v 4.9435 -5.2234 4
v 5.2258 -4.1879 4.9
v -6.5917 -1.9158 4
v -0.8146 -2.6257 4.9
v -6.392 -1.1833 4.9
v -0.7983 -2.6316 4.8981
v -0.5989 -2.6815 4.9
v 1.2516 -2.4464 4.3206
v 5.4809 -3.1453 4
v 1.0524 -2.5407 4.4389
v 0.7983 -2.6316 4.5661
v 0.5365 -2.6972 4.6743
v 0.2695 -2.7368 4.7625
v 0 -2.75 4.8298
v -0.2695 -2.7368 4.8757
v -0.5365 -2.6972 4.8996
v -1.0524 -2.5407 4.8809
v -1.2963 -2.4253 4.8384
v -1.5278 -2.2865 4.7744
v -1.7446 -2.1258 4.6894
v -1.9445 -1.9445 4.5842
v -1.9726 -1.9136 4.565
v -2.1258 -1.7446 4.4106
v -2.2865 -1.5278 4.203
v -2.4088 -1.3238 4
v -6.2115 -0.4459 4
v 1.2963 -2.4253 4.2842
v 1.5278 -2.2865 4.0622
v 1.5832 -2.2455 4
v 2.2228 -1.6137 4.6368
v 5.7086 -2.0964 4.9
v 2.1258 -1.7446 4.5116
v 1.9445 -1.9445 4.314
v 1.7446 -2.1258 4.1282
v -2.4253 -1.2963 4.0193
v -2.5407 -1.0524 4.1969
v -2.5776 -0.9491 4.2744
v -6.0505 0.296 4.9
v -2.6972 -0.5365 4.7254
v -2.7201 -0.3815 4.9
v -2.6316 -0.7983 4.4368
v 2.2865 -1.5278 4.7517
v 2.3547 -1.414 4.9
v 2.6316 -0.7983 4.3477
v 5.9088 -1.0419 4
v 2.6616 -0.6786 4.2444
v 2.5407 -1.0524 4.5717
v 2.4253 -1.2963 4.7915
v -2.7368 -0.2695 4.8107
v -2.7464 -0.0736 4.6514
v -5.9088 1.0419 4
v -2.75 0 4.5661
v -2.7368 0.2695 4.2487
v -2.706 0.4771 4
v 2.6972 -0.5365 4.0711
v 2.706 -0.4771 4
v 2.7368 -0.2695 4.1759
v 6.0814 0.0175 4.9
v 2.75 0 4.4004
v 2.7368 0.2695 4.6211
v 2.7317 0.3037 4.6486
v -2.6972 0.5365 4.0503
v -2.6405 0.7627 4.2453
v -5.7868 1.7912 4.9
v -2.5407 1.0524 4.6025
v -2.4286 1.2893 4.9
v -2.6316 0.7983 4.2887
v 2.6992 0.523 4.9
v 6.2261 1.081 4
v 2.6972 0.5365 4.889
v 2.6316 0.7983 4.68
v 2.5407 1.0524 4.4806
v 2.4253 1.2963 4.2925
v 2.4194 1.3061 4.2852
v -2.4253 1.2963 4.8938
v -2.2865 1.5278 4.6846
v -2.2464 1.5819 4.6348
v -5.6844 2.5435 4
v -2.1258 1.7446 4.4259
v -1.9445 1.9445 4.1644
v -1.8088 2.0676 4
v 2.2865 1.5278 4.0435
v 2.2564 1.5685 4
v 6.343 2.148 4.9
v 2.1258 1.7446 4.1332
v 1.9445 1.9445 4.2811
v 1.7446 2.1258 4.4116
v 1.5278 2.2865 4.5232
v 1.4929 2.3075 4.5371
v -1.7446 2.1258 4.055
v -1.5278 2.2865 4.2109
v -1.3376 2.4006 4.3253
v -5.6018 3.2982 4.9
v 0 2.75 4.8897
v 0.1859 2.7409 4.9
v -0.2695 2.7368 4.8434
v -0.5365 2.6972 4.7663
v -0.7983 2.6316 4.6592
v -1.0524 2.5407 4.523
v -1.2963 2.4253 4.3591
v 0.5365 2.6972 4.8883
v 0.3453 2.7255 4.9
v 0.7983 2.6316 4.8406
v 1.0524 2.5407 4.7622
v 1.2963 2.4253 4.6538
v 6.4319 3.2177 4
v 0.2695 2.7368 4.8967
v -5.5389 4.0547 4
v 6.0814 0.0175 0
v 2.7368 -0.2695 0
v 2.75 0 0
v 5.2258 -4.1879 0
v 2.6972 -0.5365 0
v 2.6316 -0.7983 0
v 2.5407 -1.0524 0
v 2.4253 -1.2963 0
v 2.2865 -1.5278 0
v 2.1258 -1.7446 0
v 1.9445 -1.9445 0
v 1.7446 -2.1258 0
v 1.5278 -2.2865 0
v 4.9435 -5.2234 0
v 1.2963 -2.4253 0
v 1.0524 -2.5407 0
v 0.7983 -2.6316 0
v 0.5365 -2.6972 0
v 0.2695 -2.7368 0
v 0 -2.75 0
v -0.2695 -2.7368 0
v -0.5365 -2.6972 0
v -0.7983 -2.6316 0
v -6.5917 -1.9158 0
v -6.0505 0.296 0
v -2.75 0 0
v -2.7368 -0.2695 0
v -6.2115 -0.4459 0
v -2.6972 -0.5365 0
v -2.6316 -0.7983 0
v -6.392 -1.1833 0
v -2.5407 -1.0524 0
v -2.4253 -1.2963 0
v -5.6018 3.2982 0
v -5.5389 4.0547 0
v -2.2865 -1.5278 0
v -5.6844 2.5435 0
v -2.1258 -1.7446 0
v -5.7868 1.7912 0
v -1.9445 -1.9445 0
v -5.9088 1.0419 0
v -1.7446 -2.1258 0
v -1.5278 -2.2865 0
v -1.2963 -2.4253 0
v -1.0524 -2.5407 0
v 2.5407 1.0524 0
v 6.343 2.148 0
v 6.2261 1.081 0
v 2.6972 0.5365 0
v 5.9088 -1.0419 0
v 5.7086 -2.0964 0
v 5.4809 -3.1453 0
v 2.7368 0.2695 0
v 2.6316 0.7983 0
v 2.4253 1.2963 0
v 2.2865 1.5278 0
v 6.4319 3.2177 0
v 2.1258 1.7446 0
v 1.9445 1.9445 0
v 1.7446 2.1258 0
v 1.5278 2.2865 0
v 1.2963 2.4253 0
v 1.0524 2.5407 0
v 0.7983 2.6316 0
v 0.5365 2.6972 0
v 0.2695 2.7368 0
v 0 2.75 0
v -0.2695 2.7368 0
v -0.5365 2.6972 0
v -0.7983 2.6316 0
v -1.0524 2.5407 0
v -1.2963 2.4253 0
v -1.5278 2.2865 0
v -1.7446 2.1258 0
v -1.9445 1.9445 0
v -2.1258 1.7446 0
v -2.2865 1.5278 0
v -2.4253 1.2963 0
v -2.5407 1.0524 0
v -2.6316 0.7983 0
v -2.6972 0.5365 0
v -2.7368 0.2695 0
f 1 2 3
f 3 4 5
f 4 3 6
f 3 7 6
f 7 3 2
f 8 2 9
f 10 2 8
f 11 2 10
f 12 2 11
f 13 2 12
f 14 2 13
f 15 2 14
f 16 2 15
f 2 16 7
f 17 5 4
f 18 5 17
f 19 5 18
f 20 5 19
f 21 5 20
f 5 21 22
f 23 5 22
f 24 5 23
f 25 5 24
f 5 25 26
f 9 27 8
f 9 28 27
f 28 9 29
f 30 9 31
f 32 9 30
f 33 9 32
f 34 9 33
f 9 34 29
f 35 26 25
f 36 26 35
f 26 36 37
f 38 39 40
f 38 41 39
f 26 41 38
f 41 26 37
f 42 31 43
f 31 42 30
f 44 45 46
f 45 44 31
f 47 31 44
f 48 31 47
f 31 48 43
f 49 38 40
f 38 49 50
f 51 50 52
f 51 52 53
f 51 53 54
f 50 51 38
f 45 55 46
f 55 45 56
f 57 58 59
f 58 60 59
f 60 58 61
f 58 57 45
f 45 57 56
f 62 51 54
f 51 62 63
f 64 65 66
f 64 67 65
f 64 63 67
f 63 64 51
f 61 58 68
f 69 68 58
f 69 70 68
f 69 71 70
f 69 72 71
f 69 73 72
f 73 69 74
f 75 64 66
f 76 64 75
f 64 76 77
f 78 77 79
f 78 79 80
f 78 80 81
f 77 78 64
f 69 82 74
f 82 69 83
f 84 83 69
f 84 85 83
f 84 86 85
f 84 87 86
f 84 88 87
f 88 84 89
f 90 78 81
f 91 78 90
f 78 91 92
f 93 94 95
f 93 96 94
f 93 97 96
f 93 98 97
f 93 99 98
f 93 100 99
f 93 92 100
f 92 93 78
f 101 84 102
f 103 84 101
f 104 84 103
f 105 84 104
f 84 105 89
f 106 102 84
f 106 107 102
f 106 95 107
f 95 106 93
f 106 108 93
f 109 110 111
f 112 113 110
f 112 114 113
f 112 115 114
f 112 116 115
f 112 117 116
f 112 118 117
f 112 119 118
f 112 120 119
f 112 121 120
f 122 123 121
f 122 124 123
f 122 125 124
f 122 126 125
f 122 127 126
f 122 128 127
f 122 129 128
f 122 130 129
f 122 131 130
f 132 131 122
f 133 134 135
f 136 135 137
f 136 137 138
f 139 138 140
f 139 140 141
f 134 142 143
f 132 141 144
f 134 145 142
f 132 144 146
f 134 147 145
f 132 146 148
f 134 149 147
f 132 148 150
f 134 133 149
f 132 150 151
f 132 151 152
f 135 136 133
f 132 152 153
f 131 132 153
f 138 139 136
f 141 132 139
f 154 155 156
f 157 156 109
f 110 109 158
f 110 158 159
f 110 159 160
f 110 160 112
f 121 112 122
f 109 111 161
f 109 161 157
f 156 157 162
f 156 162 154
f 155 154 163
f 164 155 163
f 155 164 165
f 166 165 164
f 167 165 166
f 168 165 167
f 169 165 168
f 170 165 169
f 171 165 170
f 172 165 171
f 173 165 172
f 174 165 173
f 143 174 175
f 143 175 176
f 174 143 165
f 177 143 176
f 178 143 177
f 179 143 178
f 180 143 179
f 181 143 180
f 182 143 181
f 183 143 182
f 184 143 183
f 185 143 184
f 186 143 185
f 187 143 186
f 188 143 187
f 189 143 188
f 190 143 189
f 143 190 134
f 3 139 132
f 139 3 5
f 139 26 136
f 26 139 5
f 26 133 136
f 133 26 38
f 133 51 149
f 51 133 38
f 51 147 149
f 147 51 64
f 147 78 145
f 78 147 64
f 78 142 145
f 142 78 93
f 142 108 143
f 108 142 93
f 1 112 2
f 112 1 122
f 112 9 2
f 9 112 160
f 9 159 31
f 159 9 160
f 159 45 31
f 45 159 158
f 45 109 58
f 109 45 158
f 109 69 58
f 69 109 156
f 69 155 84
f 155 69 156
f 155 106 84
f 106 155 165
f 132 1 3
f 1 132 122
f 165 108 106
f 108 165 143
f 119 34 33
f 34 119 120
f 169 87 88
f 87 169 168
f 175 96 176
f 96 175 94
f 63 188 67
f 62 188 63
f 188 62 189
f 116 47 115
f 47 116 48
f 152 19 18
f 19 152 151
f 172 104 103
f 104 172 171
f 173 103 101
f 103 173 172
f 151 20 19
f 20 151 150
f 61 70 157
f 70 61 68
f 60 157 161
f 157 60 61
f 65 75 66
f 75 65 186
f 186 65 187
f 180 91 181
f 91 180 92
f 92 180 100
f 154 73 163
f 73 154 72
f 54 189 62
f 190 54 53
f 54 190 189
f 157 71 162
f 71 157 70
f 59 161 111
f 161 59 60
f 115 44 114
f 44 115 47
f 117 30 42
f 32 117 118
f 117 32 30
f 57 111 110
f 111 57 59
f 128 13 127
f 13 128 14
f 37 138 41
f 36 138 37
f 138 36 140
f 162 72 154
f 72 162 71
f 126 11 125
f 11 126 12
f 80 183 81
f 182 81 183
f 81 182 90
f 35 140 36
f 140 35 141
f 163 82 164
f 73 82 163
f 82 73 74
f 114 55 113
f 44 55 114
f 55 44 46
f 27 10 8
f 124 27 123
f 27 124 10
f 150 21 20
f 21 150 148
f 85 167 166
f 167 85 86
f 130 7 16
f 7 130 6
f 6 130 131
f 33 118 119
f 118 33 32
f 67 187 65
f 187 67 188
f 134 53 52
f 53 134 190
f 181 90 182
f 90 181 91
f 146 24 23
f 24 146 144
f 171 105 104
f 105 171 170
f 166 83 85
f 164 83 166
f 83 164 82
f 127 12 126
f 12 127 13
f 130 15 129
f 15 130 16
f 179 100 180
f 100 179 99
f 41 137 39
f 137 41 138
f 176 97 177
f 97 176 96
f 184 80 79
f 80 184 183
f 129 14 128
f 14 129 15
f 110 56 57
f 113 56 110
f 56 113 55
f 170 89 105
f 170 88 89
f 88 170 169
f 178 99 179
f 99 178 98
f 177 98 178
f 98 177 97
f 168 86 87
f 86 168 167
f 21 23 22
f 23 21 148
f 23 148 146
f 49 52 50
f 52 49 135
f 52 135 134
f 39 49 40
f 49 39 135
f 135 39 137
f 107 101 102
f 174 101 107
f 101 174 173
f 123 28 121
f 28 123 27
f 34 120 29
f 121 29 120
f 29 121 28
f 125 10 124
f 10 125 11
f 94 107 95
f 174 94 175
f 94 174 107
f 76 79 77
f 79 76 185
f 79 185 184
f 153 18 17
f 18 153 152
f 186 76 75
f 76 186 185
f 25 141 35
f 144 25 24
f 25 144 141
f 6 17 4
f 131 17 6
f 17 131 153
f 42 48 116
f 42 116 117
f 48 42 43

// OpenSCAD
// file: ../../mount_common.scad
// Fixed measurements shared by every mount option.
// Single owner: these come from the hand sketch (or were fixed by Cat) and must
// be identical in all three models. Change a value here, rebuild, and every
// option follows. Never redefine these in a model file.
//
// Source tags: [written] on the sketch, [scaled] measured off the sketch,
// [fixed] decided by Cat (not on the sketch).

/* [Envelope] */
width  = 55;   // [written] block width / camera face width
height = 110;  // [written]

/* [Ring mounting holes] */
ring_hole_d       = 2.25;  // [written] pilot for the Ring bracket screws
ring_hole_spacing = 91.5;  // [written] centre to centre, vertically centred
ring_hole_depth   = 12;    // [chosen]  measured into the camera face

/* [Wiring pocket] */
pocket_z_min      = 30;    // [written] bottom of pocket above block bottom
pocket_z_max      = 60;    // [written] top of pocket above block bottom
pocket_deep_inset = 9;     // [scaled]  pocket edge to deep side, front view
pocket_width      = 34.3;  // [scaled]  front-view width
pocket_depth      = 15;    // [fixed]   behind the camera plate

/* [Cable hole] */
cable_d          = 8;      // [written]
cable_z          = 35;     // [scaled] centre height
cable_deep_inset = 17;     // [scaled] centre to deep side (where the wire leaves the wall)

/* [Mounting screws] (through the width, into the mounting surface) */
// Size is shared so every option takes the same screws. Their POSITIONS are not
// fixed (Cat, 2026-11-01): each model sets its own screw_y / screw_z.
// Screws: #8 flat (bevel) head wood screws [fixed by Cat]. Sizes per ASME
// B18.6.1 as recalled, not looked up: shank 0.164 in (4.17 mm), head up to
// 0.332 in (8.43 mm), 82 degree head. Measure a real screw to confirm.
screw_d      = 4.6;        // [fixed] clearance for #8 (4.17 mm shank) so it pulls the mount tight
screw_head_d = 8.8;        // [fixed] countersink diameter for the #8 head (8.43 mm max)
screw_sink_angle = 82;     // [fixed] US flat-head angle (metric is 90)
// main file
// Print file: option 4 (pivot with roof), the toothed washer.
// build.ps1 exports ../stl/washer.stl from this file. Print orientation: Flat face down, teeth up.
//
// To change this one print: uncomment a setting below (or add any value from
// ../option4_pivot.scad), then in OpenSCAD press F6 and use File > Export > STL.
// The last value set wins, so a setting here only affects this print.
//   - Fixed measurements (mount_common.scad) can't be changed here: the build fails.
//   - Print tolerances that two parts share must match, so change those in
//     ../option4_pivot.scad instead. The build warns if one is set here.

include <../option4_pivot.scad>

part = "washer";

// Settings for this print:
// (none specific to this part)
